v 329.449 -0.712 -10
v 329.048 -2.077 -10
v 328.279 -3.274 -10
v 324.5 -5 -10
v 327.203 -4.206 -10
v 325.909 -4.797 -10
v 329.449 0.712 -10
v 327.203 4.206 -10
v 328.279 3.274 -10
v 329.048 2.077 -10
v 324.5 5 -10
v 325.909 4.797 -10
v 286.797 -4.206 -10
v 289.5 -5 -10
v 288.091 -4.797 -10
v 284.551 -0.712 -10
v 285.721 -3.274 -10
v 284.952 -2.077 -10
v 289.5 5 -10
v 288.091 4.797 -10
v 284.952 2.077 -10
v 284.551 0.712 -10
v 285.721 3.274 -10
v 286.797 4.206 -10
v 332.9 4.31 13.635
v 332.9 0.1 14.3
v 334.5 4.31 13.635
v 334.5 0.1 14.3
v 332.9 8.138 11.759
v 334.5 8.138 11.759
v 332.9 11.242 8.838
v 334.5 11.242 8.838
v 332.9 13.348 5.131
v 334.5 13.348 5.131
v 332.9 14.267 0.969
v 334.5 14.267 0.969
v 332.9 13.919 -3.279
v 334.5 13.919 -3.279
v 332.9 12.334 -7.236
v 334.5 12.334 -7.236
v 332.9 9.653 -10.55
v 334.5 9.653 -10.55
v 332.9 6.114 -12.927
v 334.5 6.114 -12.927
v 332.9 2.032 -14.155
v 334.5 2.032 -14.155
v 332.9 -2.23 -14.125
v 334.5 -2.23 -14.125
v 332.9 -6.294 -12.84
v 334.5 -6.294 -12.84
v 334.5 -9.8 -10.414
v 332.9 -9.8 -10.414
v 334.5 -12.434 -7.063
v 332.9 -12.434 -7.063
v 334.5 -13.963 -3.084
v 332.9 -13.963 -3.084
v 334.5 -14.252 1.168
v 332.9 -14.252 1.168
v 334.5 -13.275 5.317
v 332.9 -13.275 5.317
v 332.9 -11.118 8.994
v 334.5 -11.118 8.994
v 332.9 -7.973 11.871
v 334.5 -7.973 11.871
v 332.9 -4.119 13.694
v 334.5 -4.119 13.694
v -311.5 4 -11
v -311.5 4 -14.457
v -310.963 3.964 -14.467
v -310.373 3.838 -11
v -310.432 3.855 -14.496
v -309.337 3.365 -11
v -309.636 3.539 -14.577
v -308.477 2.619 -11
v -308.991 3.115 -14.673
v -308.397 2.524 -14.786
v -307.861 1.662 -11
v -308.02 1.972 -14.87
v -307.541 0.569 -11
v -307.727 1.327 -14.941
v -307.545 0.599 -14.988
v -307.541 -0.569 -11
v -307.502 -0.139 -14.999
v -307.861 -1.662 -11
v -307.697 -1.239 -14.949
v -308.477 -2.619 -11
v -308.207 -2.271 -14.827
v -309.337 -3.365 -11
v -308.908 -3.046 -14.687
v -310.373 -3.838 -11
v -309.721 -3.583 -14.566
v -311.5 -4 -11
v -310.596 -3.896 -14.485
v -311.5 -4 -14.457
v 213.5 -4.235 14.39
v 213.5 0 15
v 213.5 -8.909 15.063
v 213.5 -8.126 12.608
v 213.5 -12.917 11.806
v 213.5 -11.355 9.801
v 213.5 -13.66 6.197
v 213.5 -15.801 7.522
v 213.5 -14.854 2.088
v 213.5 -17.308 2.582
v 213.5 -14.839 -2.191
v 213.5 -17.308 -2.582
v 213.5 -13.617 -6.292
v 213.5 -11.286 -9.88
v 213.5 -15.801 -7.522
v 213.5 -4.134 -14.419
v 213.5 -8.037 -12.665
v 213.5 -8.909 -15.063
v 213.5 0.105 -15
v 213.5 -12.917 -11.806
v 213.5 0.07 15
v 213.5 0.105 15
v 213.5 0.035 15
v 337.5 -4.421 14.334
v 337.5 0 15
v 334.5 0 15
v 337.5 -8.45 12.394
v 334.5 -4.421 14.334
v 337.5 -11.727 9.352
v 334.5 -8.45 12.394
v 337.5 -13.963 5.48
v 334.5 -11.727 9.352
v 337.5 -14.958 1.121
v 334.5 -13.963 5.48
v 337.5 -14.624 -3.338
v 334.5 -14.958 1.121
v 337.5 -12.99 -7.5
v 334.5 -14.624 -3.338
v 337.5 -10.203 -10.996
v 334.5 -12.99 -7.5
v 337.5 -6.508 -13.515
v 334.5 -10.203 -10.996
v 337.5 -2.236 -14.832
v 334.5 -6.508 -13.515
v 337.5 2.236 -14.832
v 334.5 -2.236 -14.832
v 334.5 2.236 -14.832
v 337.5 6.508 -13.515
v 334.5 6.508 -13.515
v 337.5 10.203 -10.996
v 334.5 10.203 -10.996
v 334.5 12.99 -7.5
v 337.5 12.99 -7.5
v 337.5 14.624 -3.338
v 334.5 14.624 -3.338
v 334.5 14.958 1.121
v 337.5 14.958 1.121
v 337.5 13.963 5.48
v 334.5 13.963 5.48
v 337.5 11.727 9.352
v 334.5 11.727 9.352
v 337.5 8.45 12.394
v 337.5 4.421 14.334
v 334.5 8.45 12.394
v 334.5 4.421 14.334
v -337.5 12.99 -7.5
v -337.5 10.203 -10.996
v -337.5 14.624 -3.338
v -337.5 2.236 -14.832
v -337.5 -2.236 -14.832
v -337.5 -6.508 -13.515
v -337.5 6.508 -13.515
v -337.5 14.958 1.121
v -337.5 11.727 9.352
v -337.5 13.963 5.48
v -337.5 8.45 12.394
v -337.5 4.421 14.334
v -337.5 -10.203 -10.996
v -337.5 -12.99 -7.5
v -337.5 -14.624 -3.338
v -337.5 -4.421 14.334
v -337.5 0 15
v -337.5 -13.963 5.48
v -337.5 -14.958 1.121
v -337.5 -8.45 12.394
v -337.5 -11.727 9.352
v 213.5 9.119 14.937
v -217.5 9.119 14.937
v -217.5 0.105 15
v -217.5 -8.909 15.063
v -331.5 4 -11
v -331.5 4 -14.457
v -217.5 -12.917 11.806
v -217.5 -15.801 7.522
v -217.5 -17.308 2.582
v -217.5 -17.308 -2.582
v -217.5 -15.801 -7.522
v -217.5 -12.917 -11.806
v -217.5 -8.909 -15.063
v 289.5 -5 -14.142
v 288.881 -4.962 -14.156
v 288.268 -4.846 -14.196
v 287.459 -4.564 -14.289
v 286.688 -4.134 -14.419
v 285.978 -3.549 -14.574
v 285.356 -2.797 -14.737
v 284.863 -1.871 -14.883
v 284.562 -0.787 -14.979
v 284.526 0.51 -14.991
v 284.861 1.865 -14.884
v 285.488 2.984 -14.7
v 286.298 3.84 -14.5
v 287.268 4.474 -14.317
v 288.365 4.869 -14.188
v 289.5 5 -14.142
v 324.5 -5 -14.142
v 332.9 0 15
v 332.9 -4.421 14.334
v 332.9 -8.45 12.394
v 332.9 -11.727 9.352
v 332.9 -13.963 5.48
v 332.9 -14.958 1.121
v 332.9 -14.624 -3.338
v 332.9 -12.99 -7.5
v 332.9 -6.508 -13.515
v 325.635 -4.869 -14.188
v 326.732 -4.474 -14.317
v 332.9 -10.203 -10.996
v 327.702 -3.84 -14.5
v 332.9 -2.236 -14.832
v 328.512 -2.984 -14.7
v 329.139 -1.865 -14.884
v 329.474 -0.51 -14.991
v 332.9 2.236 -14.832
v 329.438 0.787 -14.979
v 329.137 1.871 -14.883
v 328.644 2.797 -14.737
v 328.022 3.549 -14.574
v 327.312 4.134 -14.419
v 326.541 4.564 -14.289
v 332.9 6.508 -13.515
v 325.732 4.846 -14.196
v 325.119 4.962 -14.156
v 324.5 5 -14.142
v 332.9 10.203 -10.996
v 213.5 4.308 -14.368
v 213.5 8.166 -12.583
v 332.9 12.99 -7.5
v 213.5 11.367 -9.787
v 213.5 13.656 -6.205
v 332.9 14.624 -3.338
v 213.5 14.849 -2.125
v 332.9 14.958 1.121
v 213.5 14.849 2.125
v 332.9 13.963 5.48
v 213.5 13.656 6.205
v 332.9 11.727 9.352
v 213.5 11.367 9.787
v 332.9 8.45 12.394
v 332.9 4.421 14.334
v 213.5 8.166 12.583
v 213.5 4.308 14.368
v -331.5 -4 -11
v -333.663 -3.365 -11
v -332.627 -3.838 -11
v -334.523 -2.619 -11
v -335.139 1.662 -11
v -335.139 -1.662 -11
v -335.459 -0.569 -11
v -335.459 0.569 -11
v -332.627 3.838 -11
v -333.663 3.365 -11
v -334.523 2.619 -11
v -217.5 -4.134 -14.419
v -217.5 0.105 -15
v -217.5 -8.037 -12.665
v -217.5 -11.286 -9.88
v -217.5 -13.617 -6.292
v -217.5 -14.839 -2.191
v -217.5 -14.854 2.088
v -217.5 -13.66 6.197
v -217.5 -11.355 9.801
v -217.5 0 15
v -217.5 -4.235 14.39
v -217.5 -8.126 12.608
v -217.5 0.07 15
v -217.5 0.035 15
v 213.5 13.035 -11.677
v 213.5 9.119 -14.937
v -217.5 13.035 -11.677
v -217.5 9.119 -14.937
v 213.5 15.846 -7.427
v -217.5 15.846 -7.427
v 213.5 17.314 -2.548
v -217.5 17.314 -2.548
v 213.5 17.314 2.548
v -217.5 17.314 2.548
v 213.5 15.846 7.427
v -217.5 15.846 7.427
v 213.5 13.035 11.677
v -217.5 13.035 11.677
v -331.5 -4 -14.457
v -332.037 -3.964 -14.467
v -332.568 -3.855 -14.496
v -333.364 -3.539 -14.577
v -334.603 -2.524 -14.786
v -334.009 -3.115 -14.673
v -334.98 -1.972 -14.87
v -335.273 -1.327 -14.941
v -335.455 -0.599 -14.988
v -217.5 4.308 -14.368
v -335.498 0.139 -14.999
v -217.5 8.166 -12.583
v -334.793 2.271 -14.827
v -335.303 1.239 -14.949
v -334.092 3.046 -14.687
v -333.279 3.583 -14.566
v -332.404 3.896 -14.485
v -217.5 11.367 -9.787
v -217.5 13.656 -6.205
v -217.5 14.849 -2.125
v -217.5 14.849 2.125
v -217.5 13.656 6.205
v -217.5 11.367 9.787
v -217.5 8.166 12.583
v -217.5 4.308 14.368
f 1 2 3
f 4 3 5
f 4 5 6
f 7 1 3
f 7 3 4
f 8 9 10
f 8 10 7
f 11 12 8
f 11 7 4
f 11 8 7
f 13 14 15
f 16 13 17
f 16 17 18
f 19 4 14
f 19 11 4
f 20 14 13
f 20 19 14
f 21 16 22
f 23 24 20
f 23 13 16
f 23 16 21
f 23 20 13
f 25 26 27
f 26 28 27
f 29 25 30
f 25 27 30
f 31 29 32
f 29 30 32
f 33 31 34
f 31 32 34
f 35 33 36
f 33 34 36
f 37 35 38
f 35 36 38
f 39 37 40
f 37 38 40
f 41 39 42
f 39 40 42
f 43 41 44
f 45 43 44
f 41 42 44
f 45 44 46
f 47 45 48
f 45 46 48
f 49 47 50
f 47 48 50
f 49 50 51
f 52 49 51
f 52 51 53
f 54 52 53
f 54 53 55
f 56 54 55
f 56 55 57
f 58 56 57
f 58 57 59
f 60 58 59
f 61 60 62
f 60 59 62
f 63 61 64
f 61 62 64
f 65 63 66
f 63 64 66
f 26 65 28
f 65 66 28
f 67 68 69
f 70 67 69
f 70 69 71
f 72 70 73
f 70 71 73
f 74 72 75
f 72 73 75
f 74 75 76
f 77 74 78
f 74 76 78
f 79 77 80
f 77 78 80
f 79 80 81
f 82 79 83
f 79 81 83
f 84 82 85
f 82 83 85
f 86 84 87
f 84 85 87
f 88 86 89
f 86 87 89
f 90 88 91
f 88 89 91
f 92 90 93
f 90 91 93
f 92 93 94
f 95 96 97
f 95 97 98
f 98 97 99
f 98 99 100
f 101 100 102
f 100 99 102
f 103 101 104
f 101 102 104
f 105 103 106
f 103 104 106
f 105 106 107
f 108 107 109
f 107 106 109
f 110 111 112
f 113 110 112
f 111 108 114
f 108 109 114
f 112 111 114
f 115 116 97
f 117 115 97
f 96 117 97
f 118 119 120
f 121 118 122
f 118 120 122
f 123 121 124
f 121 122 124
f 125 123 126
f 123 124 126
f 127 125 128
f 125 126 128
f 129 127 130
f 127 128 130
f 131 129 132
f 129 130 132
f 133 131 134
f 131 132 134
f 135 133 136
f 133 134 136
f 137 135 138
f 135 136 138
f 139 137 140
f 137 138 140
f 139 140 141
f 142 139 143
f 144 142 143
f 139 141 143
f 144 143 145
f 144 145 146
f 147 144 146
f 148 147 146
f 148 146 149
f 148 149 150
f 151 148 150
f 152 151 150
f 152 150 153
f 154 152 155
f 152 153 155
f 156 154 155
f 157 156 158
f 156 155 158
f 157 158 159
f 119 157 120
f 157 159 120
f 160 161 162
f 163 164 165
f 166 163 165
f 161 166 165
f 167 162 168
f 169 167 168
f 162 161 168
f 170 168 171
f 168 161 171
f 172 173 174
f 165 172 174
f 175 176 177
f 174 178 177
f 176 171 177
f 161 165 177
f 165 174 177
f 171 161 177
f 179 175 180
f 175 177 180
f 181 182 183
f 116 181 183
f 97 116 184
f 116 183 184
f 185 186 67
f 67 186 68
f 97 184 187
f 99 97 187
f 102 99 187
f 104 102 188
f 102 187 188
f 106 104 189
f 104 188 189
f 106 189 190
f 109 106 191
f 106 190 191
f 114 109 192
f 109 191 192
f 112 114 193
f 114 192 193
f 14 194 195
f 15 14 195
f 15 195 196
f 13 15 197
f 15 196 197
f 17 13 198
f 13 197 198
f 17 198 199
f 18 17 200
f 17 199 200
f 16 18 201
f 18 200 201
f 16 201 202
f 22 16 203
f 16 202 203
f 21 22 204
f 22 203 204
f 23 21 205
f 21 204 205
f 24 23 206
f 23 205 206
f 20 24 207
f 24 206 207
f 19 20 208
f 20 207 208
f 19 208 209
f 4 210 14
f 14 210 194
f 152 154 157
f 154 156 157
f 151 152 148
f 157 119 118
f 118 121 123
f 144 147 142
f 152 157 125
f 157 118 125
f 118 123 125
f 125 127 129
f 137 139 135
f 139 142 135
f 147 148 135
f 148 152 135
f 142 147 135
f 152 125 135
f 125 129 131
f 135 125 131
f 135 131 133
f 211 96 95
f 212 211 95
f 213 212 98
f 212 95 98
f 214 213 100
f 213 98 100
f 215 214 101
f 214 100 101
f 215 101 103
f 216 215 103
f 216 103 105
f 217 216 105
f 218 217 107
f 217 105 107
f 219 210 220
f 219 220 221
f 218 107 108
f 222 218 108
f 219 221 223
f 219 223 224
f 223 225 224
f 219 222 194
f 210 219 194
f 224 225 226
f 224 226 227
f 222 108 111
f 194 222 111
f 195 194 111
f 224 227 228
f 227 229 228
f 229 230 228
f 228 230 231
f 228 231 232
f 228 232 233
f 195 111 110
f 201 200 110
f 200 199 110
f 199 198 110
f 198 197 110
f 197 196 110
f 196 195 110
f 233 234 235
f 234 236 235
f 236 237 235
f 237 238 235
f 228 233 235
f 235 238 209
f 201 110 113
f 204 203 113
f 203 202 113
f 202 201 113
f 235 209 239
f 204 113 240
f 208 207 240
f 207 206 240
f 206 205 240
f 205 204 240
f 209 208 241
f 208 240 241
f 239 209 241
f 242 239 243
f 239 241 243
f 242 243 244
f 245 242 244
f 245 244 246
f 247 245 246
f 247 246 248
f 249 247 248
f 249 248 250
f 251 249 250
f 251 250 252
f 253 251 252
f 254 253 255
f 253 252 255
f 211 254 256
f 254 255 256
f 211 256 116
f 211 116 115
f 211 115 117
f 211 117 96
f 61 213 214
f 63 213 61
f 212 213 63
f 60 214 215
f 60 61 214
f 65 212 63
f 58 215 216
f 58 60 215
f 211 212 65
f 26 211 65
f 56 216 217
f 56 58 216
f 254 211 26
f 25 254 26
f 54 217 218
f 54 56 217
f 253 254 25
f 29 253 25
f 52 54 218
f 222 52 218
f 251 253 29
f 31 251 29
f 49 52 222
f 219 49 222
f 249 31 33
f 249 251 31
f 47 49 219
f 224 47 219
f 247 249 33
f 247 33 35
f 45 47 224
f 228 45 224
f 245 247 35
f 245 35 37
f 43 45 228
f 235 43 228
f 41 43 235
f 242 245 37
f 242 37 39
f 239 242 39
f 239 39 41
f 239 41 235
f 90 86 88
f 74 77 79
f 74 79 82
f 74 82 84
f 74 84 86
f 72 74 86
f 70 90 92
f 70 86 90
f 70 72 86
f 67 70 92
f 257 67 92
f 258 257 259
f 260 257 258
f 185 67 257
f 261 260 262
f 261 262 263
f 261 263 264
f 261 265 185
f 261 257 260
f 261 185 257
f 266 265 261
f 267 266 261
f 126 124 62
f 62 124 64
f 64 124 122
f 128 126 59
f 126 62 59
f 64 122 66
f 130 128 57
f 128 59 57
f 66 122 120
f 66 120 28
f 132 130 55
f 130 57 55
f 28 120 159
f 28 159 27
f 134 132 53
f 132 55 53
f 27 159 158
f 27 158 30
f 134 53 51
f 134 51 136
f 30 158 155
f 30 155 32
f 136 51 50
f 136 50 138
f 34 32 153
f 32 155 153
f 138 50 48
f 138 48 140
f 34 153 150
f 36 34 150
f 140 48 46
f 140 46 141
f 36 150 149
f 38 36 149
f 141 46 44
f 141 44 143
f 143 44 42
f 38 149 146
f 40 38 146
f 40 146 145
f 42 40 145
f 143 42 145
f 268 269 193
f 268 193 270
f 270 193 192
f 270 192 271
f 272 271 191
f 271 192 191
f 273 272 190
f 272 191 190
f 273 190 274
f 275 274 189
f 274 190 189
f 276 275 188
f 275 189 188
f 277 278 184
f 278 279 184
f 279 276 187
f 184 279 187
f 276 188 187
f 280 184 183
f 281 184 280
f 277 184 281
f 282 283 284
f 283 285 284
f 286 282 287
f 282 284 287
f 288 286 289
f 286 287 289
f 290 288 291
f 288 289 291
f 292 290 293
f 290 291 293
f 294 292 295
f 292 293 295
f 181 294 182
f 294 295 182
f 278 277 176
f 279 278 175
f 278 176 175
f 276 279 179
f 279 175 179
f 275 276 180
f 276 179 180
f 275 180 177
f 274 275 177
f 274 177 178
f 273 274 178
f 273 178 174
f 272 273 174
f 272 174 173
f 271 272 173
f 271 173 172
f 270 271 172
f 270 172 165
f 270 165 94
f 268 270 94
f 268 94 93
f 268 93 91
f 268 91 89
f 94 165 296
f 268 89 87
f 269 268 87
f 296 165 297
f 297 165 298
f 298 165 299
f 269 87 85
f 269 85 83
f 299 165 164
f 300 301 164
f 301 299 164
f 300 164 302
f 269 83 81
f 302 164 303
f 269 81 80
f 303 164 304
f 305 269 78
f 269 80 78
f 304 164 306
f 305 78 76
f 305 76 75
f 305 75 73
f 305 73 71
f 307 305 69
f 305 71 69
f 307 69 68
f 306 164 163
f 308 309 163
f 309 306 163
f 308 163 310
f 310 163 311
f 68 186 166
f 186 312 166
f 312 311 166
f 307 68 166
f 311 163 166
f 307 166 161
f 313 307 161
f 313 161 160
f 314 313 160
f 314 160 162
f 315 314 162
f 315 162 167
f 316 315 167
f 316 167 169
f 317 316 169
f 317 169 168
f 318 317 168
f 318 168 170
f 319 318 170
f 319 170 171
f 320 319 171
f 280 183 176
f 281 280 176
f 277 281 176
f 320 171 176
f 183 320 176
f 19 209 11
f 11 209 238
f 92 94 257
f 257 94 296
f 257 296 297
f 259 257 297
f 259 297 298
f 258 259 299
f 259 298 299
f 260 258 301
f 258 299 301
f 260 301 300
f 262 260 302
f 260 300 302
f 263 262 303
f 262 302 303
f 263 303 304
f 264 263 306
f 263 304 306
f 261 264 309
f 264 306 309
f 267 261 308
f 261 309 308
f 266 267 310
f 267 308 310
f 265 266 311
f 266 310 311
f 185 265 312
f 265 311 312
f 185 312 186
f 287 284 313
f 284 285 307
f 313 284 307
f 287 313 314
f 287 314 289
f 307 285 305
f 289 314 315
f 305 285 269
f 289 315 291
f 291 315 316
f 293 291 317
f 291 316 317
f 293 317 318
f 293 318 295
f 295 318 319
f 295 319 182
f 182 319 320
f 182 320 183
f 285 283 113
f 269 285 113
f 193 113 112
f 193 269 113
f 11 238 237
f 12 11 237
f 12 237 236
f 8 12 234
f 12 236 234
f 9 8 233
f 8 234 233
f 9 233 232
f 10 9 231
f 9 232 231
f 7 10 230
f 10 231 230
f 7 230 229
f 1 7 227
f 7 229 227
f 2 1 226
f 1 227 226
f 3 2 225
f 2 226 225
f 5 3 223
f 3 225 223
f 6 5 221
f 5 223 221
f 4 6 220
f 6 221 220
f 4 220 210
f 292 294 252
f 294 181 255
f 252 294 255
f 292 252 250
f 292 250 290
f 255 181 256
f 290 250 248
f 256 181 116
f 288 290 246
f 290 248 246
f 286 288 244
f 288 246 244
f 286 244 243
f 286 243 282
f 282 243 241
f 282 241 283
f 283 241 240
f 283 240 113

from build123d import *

# Parameters (mm, degrees)
CUT_EXTRUDE1_DEPTH = 431
CUT_EXTRUDE2_DEPTH = 4
SKETCH4_W          = 1.6
SKETCH4_H          = 0.7
CUT_EXTRUDE3_DEPTH = 5


with BuildPart() as part:
    # Sketch1 → Revolve1 (revolve)
    with BuildSketch(Plane.XY, mode=Mode.PRIVATE) as revolve1_sk:
        Polygon((-337.5, 0), (337.5, 0), (337.5, 15), (213.5, 15), (213.5, 17.5), (-217.5, 17.5), (-217.5, 15), (-337.5, 15), align=None)
    revolve(revolve1_sk.sketch.rotate(Axis((-337.5, 0, 0), (1, 0, 0)), 90), axis=Axis((-337.5, 0, 0), (1, 0, 0)))

    # Sketch2 → Cut-Extrude1 (cut)
    with BuildSketch(Plane.ZY.offset(217.5)):
        with BuildLine():
            Line((-14.936600675, 9.118550338), (-15.062665819, -8.908765258))
            ThreePointArc((-15.062665819, -8.908765258), (-17.499572122, 0.12237463), (-14.936600675, 9.118550338))
        make_face()
        with BuildLine():
            Line((14.936600675, 9.118550338), (15.062665819, -8.908765258))
            ThreePointArc((15.062665819, -8.908765258), (17.499572122, 0.12237463), (14.936600675, 9.118550338))
        make_face()
    extrude(amount=-CUT_EXTRUDE1_DEPTH, mode=Mode.SUBTRACT)

    # Sketch3 → Cut-Extrude2 (cut)
    with BuildSketch(Plane.XY.offset(-15)):
        with BuildLine():
            Line((-331.5, 4), (-311.5, 4))
            ThreePointArc((-311.5, 4), (-307.5, 0), (-311.5, -4))
            Line((-311.5, -4), (-331.5, -4))
            ThreePointArc((-331.5, -4), (-335.5, 0), (-331.5, 4))
        make_face()
    extrude(amount=CUT_EXTRUDE2_DEPTH, mode=Mode.SUBTRACT)

    # Sketch4 → Cut-Revolve1 (revolve, cut)
    with BuildSketch(Plane.XY, mode=Mode.PRIVATE) as cut_revolve1_sk:
        with Locations((333.7, 14.65)):
            Rectangle(SKETCH4_W, SKETCH4_H)
    revolve(cut_revolve1_sk.sketch.rotate(Axis((337.5, 0, 0), (-1, 0, 0)), 270.400663256), axis=Axis((337.5, 0, 0), (-1, 0, 0)), mode=Mode.SUBTRACT)

    # Sketch5 → Cut-Extrude3 (cut)
    with BuildSketch(Plane.XY.offset(-15)):
        with BuildLine():
            Line((324.5, -5), (289.5, -5))
            ThreePointArc((289.5, -5), (284.5, 0), (289.5, 5))
            Line((289.5, 5), (324.5, 5))
            ThreePointArc((324.5, 5), (329.5, 0), (324.5, -5))
        make_face()
    extrude(amount=CUT_EXTRUDE3_DEPTH, mode=Mode.SUBTRACT)


solid = part.part
